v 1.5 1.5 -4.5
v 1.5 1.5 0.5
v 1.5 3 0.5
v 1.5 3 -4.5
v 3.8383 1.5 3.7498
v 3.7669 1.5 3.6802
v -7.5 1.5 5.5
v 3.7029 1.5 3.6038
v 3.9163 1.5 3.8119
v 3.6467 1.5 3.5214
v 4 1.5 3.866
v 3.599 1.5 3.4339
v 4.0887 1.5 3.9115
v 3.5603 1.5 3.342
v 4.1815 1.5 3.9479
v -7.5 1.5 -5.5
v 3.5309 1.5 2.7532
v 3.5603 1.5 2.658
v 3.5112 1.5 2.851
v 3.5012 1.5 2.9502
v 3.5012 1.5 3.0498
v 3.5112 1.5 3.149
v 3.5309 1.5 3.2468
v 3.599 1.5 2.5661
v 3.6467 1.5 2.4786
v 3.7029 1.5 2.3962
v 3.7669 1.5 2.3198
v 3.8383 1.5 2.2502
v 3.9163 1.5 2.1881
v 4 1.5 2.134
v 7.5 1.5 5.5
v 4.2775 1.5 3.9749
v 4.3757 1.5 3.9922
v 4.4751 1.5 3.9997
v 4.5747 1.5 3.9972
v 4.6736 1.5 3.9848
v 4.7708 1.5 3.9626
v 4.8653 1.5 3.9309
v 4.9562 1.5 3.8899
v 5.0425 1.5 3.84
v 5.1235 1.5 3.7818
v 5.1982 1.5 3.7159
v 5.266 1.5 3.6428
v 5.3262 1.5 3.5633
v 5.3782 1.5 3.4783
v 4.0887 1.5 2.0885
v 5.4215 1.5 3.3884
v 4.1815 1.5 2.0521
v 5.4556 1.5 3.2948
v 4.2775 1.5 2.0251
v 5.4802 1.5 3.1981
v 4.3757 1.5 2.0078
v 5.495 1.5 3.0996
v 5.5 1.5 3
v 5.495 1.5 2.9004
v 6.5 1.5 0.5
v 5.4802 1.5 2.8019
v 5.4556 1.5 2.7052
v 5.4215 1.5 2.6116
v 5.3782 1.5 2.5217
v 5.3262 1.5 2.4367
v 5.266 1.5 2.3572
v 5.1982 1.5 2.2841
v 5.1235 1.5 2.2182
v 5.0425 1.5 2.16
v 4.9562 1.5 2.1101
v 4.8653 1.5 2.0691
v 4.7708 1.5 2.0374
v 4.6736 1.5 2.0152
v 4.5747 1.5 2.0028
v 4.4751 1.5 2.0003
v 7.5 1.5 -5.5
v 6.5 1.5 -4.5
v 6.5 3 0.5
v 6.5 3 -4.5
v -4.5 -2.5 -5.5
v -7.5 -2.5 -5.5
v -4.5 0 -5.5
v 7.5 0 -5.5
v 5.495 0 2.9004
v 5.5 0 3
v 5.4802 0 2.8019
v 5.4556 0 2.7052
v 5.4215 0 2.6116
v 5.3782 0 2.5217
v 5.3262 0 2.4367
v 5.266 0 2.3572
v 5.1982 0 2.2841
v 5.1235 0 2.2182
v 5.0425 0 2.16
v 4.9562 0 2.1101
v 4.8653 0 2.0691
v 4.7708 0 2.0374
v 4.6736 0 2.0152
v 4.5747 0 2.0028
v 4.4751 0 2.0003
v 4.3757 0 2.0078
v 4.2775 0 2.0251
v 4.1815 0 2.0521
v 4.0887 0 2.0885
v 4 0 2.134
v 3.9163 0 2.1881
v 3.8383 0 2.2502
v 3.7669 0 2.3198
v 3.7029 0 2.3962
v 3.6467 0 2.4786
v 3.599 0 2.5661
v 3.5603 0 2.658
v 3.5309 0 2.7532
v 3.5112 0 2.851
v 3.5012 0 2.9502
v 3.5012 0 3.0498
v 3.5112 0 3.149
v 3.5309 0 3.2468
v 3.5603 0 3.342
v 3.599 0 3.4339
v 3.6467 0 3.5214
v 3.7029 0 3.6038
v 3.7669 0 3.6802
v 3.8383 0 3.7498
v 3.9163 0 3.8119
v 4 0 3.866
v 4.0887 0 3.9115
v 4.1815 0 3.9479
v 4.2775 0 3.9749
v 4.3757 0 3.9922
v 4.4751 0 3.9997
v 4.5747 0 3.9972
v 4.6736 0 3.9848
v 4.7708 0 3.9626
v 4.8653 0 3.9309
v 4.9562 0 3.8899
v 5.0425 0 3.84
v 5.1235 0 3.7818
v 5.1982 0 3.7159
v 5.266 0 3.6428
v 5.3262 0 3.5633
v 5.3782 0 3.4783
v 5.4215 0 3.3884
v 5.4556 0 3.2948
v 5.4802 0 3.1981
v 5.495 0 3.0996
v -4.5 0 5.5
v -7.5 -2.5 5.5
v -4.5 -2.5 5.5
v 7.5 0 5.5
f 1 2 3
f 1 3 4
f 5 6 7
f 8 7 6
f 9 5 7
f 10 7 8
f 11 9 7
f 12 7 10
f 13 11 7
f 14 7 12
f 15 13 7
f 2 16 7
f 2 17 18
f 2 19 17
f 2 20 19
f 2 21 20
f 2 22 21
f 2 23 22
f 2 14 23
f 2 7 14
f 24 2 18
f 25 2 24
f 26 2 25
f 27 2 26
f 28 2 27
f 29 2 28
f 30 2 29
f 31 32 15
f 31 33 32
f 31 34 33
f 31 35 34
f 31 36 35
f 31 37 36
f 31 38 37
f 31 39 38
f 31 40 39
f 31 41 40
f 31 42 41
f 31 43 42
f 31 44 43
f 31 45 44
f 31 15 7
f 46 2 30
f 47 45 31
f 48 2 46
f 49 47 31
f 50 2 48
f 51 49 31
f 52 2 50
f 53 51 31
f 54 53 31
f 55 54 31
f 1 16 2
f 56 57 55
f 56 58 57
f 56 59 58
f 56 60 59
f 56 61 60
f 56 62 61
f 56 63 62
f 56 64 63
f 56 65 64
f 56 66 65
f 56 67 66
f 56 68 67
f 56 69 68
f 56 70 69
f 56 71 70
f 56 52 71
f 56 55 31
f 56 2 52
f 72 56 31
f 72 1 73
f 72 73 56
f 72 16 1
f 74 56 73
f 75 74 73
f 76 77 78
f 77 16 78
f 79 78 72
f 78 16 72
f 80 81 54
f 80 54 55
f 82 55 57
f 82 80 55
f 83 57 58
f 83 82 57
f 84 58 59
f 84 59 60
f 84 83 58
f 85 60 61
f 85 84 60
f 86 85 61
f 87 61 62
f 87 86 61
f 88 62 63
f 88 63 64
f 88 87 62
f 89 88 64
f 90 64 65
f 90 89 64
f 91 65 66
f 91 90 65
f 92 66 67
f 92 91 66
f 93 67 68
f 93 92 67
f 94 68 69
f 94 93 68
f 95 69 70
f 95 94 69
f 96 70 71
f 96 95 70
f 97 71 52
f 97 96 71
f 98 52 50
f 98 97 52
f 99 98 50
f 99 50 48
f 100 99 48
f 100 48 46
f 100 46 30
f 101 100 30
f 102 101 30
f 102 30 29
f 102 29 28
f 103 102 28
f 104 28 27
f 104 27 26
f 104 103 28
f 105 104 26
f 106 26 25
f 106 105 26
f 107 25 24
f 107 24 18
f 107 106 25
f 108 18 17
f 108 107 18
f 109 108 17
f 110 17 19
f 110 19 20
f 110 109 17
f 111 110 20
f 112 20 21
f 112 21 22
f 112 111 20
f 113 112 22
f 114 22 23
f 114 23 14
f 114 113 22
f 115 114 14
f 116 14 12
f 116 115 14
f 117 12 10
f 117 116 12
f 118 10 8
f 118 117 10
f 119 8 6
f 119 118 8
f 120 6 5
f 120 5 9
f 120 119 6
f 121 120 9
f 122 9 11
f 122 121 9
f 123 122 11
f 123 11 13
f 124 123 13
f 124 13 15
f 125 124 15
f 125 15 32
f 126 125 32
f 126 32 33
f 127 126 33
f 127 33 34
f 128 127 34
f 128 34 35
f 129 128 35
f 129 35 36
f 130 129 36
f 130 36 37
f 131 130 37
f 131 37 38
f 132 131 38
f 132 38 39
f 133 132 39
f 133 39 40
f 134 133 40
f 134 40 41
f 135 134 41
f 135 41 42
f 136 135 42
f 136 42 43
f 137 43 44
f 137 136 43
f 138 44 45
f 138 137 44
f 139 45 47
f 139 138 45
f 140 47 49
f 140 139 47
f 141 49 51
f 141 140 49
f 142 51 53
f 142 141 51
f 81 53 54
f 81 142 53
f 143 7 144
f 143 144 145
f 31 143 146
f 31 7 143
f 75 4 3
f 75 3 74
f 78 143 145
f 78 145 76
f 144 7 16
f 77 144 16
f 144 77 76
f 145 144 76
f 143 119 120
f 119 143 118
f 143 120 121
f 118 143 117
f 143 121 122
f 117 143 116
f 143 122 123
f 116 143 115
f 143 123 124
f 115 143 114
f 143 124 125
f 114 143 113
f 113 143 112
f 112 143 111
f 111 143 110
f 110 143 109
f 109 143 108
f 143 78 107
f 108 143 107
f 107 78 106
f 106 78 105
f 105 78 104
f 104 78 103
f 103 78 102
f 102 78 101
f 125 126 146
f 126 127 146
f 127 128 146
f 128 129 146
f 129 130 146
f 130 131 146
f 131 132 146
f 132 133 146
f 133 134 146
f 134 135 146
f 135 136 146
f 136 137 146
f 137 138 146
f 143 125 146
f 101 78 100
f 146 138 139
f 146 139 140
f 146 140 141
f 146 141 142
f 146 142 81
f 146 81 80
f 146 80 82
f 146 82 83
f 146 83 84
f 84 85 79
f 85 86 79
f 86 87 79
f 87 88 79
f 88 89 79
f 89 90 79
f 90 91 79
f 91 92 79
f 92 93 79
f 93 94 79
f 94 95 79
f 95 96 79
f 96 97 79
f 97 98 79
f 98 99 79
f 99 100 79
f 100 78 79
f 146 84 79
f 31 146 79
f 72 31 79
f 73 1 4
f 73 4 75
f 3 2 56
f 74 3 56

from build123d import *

# Parameters (mm, degrees)
SKETCH_1_R      = 1
SKETCH_1_W      = 5
SKETCH_1_H      = 5
SKETCH_1_W_2    = 3
SKETCH_1_H_2    = 11
EXTRUDE_1_DEPTH = 1.5
SKETCH_1_3_W    = 3
SKETCH_1_3_H    = 11
EXTRUDE_2_DEPTH = 2.5
EXTRUDE_START   = 1.5
SKETCH_1_4_W    = 5
SKETCH_1_4_H    = 5
EXTRUDE_3_DEPTH = 1.5


with BuildPart() as part:
    # Эскиз1 → Бобышка-Вытянуть1 (new body)
    with BuildSketch(Plane(origin=(0, 0, 0), x_dir=(1, 0, 0), z_dir=(0, 1, 0))):
        Polygon((7.5, -3), (7.5, 5.5), (-4.5, 5.5), (-4.5, -5.5), (4.5, -5.5), (7.5, -5.5), align=None)
        with Locations((4.5, -3)):
            Circle(SKETCH_1_R, mode=Mode.SUBTRACT)
        with Locations((4, 2)):
            Rectangle(SKETCH_1_W, SKETCH_1_H, mode=Mode.SUBTRACT)
        with Locations((-6, 0)):
            Rectangle(SKETCH_1_W_2, SKETCH_1_H_2)
        with Locations((4, 2)):
            Rectangle(SKETCH_1_W, SKETCH_1_H)
    extrude(amount=EXTRUDE_1_DEPTH)

    # Эскиз1<3> → Бобышка-Вытянуть2 (add)
    with BuildSketch(Plane(origin=(0, 0, 0), x_dir=(1, 0, 0), z_dir=(0, 1, 0))):
        with Locations((-6, 0)):
            Rectangle(SKETCH_1_3_W, SKETCH_1_3_H)
    extrude(amount=-EXTRUDE_2_DEPTH)

    # Эскиз1<4> → Бобышка-Вытянуть3 (add)
    with BuildSketch(Plane(origin=(0, 0, 0), x_dir=(1, 0, 0), z_dir=(0, 1, 0)).offset(EXTRUDE_START)):
        with Locations((4, 2)):
            Rectangle(SKETCH_1_4_W, SKETCH_1_4_H)
    extrude(amount=EXTRUDE_3_DEPTH)


solid = part.part
